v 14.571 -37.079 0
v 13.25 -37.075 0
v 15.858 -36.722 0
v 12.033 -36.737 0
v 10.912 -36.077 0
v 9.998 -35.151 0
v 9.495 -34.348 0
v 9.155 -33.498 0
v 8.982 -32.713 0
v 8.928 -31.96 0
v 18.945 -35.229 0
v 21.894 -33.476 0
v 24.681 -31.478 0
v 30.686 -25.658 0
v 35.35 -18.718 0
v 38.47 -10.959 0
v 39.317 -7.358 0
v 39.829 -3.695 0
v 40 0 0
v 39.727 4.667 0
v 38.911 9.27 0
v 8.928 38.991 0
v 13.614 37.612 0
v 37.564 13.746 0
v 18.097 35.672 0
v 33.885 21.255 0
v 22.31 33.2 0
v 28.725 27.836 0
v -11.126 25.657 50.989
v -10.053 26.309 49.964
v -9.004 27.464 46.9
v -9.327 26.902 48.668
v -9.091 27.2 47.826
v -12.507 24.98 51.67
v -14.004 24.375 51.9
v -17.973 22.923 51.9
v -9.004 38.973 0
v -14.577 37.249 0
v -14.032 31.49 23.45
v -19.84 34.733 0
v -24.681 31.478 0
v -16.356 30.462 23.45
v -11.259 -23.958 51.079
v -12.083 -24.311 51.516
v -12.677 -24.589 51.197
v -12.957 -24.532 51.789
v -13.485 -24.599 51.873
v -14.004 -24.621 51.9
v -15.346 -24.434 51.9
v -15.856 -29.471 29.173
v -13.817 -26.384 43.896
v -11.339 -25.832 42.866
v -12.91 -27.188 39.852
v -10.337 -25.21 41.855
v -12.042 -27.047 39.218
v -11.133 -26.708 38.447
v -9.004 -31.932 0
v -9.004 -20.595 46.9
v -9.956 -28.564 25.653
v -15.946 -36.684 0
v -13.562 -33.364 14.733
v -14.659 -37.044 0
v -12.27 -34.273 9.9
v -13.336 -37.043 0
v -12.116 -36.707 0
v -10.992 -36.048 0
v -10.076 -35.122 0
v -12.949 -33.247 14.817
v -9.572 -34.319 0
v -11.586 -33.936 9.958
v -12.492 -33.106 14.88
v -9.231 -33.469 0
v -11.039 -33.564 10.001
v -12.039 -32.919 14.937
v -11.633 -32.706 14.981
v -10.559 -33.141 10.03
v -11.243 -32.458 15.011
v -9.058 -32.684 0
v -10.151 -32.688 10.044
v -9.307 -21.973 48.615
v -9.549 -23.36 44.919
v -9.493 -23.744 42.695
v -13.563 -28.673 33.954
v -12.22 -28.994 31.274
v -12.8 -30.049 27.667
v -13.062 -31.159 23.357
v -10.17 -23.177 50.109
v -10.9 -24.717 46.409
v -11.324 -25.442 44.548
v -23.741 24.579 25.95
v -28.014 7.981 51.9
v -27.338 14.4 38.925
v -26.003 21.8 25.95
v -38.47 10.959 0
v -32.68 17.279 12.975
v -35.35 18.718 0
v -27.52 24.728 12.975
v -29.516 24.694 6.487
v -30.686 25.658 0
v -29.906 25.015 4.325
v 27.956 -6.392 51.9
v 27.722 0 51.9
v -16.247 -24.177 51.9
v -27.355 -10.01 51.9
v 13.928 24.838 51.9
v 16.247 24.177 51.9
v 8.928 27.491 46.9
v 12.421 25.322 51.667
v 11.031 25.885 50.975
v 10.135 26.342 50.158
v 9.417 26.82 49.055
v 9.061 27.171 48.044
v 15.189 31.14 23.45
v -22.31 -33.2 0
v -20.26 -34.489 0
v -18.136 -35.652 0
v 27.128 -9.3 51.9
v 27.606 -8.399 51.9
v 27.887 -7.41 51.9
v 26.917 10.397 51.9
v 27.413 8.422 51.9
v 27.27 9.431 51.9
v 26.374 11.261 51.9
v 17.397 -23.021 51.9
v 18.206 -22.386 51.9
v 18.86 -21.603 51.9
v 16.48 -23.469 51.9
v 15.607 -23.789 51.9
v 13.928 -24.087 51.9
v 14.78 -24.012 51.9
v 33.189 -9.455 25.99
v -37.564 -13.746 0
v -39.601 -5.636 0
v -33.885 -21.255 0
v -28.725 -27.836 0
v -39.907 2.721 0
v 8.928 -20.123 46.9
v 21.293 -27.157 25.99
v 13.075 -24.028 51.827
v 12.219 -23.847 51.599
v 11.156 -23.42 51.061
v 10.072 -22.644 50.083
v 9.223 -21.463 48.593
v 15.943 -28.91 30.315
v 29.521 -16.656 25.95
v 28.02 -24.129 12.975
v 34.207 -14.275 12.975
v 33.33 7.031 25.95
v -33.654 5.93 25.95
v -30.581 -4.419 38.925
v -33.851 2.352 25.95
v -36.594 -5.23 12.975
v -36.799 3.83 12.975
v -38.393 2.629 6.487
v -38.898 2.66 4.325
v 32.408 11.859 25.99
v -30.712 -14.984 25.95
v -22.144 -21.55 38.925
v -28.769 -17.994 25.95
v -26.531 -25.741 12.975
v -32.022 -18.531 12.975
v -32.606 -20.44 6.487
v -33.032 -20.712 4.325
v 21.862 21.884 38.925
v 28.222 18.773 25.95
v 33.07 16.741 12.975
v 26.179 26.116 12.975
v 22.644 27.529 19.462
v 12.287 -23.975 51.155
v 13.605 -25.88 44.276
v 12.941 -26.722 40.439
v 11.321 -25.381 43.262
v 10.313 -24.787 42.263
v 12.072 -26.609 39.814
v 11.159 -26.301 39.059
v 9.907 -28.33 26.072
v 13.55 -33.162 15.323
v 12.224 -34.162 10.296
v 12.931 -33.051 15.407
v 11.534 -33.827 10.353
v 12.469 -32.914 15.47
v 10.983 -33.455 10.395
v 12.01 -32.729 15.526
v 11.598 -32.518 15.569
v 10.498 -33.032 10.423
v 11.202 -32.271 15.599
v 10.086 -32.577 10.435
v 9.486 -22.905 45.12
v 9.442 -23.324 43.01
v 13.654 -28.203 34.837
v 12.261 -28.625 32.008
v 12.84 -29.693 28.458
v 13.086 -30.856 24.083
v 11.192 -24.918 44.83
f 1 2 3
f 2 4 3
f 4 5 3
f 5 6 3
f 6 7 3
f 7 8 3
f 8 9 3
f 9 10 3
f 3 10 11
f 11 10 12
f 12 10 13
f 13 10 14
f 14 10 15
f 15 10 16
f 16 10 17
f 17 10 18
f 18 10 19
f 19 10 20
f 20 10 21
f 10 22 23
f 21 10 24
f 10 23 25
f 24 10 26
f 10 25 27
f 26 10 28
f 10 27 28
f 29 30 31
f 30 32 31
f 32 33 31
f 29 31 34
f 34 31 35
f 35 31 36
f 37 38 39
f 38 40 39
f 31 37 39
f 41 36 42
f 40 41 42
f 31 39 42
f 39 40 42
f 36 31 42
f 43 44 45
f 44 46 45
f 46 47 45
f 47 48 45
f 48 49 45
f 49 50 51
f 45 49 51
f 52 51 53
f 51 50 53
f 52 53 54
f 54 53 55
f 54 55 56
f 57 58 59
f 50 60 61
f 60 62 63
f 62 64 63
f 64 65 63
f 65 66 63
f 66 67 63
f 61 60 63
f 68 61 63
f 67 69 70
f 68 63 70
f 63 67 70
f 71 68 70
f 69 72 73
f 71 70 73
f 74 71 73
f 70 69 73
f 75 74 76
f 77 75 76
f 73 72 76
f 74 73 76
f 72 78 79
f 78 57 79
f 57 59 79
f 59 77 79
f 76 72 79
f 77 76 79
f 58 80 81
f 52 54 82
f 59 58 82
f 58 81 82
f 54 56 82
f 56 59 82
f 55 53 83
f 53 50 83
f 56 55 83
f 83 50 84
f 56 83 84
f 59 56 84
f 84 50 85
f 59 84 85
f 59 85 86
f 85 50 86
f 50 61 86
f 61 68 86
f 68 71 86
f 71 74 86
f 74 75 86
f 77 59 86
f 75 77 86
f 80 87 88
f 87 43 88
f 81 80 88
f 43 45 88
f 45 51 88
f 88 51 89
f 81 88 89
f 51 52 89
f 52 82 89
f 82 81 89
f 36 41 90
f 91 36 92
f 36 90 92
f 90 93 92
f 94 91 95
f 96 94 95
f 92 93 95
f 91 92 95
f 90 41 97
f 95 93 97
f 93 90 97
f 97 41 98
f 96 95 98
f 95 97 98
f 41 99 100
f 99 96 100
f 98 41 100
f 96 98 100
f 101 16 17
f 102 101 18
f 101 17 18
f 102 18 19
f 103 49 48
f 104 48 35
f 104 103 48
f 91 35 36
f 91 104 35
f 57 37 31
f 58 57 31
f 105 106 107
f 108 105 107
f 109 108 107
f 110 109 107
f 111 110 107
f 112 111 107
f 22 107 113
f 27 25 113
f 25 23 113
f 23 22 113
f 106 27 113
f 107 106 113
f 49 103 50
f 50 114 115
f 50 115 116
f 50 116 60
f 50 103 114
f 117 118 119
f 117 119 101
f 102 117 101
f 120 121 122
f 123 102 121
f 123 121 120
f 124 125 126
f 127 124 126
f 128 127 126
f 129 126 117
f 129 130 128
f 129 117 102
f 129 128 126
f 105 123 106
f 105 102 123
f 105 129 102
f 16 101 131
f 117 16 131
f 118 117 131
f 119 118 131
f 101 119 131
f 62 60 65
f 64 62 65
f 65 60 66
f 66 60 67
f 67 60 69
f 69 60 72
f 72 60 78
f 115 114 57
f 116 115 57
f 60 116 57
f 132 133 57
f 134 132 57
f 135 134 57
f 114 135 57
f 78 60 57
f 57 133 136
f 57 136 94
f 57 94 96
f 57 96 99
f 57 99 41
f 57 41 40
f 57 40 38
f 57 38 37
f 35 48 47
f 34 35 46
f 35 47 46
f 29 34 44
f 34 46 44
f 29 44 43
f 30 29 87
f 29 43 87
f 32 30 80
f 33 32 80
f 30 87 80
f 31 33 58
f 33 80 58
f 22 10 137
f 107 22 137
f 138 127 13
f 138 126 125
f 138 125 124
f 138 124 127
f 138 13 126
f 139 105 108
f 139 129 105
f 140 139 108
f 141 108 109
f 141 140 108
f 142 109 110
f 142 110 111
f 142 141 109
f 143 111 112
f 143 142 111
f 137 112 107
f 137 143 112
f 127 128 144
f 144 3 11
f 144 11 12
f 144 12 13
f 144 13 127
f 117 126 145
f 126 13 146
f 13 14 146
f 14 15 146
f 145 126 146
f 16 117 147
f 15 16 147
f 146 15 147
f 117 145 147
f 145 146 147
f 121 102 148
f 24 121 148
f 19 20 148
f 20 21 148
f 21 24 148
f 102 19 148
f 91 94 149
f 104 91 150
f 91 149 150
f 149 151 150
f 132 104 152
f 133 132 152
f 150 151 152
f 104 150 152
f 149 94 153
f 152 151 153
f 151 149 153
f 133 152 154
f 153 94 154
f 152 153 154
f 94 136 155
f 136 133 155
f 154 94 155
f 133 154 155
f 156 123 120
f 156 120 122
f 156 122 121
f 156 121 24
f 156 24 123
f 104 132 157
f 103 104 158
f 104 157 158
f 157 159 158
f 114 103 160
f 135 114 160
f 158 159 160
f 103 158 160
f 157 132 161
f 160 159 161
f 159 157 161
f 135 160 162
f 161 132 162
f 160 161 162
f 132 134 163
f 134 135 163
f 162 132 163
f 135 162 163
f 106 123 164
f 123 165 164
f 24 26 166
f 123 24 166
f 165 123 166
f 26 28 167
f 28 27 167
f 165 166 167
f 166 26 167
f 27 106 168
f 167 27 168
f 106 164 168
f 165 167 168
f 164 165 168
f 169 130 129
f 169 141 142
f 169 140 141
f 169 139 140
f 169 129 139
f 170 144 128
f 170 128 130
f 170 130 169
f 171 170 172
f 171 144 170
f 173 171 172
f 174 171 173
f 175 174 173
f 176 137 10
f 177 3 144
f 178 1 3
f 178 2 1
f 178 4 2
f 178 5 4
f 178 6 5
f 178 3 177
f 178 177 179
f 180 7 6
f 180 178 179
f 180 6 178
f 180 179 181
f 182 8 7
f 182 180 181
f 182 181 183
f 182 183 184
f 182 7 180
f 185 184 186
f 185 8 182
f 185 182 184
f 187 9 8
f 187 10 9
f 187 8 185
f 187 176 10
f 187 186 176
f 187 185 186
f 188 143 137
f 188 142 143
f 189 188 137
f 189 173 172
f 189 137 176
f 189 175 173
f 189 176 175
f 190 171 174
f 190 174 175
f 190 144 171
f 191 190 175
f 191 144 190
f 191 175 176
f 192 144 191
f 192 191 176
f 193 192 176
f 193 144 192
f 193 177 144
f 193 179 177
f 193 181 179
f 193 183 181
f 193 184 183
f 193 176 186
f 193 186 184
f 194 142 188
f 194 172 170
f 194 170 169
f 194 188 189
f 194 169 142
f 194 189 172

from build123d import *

# Parameters (mm, degrees)
F0_R     = 40
F5_W     = 17.9323302582
F5_H     = 58.3646646701
F6_DEPTH = 92.8
F7_R     = 5


with BuildPart() as f3:
    # F2 (on offset) → F3 section 0
    with BuildSketch(Plane.XY.offset(51.9)):
        Polygon((17.9732700356, -22.9228152642), (28.0143736566, -7.9805240452), (27.3549387144, 10.010056111), (16.2468469433, 24.1771350621), (-1.06698815, 29.1093701701), (-17.9732700356, 22.9228152642), (-28.0143736566, 7.9805240452), (-27.3549387144, -10.010056111), (-16.2468469433, -24.1771350621), (1.06698815, -29.1093701701), align=None)
    # F0 (on Top) → F3 section 1
    with BuildSketch(Plane.XY):
        Circle(F0_R)
    loft()

    # F5 (on offset) → F6 (cut)
    with BuildSketch(Plane.XZ.offset(-41.5)):
        with Locations((-0.0380412675, 24.9530088622)):
            Rectangle(F5_W, F5_H)
    extrude(amount=F6_DEPTH, mode=Mode.SUBTRACT)

    # F7
    f7_edges = [f3.edges().sort_by_distance(p)[0] for p in [
        (8.928124, 0.014656, 51.9),
        (-9.004206, -32.63119, 25.95596),
        (8.928124, -32.700734, 25.971852),
        (-9.004206, -0.017739, 51.9),
        (32.45945, 11.877962, 25.95),
        (33.241937, -9.469713, 25.95),
        (21.327134, -27.200279, 25.95),
    ]]
    fillet(f7_edges, radius=F7_R)


solid = f3.part
